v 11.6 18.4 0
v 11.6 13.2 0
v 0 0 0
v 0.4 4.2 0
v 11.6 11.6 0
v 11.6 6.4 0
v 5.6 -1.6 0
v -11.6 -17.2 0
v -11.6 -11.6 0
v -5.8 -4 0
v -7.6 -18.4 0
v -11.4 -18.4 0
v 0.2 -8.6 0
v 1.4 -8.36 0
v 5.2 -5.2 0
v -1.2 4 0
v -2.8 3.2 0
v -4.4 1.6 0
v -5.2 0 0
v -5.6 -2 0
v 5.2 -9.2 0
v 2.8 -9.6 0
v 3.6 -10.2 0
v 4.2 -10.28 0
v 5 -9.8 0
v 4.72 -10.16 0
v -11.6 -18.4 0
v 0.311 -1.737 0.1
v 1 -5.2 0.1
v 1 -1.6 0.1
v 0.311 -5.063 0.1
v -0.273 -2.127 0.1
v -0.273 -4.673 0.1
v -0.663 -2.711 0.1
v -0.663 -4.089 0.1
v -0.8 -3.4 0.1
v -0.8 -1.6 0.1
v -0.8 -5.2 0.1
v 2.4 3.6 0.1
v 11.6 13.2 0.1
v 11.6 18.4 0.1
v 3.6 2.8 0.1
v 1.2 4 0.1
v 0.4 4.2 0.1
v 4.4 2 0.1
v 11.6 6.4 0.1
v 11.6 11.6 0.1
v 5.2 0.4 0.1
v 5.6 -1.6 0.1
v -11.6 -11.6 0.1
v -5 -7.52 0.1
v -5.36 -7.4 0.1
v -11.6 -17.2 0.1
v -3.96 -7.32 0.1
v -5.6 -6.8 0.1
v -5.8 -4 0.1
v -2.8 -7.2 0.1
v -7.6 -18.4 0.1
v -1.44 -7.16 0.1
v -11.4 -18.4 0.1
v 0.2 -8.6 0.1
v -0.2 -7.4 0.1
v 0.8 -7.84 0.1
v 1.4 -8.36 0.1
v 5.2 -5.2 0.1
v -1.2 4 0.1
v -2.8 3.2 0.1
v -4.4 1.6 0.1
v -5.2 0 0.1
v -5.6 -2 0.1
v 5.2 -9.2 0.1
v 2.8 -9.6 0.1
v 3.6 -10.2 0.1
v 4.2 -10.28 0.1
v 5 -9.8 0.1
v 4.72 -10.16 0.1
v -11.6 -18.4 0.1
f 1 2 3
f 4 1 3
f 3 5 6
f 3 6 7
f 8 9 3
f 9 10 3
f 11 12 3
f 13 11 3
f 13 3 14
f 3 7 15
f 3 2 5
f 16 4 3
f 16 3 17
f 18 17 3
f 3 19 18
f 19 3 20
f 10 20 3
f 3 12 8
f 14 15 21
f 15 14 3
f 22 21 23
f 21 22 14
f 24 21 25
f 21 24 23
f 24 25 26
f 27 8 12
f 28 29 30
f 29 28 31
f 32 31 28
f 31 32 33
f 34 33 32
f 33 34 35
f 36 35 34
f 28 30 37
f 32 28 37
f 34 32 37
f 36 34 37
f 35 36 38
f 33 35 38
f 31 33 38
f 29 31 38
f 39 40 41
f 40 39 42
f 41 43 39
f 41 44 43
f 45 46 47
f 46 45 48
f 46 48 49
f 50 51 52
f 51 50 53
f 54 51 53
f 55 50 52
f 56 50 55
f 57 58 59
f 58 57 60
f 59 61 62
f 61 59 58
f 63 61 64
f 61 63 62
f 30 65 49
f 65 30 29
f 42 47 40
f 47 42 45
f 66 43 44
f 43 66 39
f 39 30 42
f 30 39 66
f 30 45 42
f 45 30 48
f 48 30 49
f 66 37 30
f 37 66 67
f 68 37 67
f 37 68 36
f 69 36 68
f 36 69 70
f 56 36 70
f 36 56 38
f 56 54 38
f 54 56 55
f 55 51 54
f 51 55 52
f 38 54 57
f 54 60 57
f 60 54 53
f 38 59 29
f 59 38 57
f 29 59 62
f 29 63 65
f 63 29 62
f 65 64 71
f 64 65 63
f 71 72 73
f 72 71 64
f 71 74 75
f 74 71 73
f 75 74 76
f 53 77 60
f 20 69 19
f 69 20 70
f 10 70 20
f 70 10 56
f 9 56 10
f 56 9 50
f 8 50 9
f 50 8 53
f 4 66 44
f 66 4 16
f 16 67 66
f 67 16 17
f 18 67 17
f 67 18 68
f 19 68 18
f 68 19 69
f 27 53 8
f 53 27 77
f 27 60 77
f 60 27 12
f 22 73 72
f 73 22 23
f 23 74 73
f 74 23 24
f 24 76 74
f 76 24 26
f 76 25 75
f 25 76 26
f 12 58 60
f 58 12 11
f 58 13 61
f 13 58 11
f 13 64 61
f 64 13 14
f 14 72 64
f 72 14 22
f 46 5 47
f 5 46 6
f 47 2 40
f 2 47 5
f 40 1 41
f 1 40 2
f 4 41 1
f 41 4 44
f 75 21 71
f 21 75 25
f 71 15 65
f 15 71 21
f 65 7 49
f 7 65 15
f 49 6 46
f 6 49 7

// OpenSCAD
// file: ../p/4-4edge.scad
use <../lib.scad>
$fa=1; $fs=0.2;
function ldraw_lib__4_4edge(realsolid=false) = [
// 0 Circle 1.0
// 0 Name: 4-4edge.dat
// 0 Author: James Jessiman
// 0 !LDRAW_ORG Primitive UPDATE 2017-01
// 0 !LICENSE Licensed under CC BY 2.0 and CC BY 4.0 : see CAreadme.txt
// 
// 0 BFC CERTIFY CCW
  [0,"BFC","CERTIFY"],
  [0,"BFC","CCW"],
// 
// 0 !HISTORY 1998-12-15 [PTadmin] Official Update 1998-10
// 0 !HISTORY 2005-12-28 [PTadmin] Official Update 2005-01
// 0 !HISTORY 2007-06-24 [PTadmin] Header formatted for Contributor Agreement
// 0 !HISTORY 2008-07-01 [PTadmin] Official Update 2008-01
// 0 !HISTORY 2017-01-15 [Steffen] BFCed
// 0 !HISTORY 2017-12-30 [PTadmin] Official Update 2017-01
// 
// 
// 2 24 1 0 0 0.9239 0 0.3827
  [2,24,1,0,0,0.9239,0,0.3827],
// 2 24 0.9239 0 0.3827 0.7071 0 0.7071
  [2,24,0.9239,0,0.3827,0.7071,0,0.7071],
// 2 24 0.7071 0 0.7071 0.3827 0 0.9239
  [2,24,0.7071,0,0.7071,0.3827,0,0.9239],
// 2 24 0.3827 0 0.9239 0 0 1
  [2,24,0.3827,0,0.9239,0,0,1],
// 2 24 0 0 1 -0.3827 0 0.9239
  [2,24,0,0,1,-0.3827,0,0.9239],
// 2 24 -0.3827 0 0.9239 -0.7071 0 0.7071
  [2,24,-0.3827,0,0.9239,-0.7071,0,0.7071],
// 2 24 -0.7071 0 0.7071 -0.9239 0 0.3827
  [2,24,-0.7071,0,0.7071,-0.9239,0,0.3827],
// 2 24 -0.9239 0 0.3827 -1 0 -0
  [2,24,-0.9239,0,0.3827,-1,0,-0],
// 2 24 -1 0 -0 -0.9239 0 -0.3827
  [2,24,-1,0,-0,-0.9239,0,-0.3827],
// 2 24 -0.9239 0 -0.3827 -0.7071 0 -0.7071
  [2,24,-0.9239,0,-0.3827,-0.7071,0,-0.7071],
// 2 24 -0.7071 0 -0.7071 -0.3827 0 -0.9239
  [2,24,-0.7071,0,-0.7071,-0.3827,0,-0.9239],
// 2 24 -0.3827 0 -0.9239 0 0 -1
  [2,24,-0.3827,0,-0.9239,0,0,-1],
// 2 24 0 0 -1 0.3827 0 -0.9239
  [2,24,0,0,-1,0.3827,0,-0.9239],
// 2 24 0.3827 0 -0.9239 0.7071 0 -0.7071
  [2,24,0.3827,0,-0.9239,0.7071,0,-0.7071],
// 2 24 0.7071 0 -0.7071 0.9239 0 -0.3827
  [2,24,0.7071,0,-0.7071,0.9239,0,-0.3827],
// 2 24 0.9239 0 -0.3827 1 0 0
  [2,24,0.9239,0,-0.3827,1,0,0],
];
module ldraw_lib__4_4edge(step=0, col=false, unit=2/5, alt=false, line=0.2, solid=!$preview)
    makepoly(ldraw_lib__4_4edge(solid), step=step, col=col, unit=unit, alt=alt, line=line, solid=solid);
ldraw_lib__4_4edge(line=0.2);
// file: ../p/4-4disc.scad
use <../lib.scad>
$fa=1; $fs=0.2;
function ldraw_lib__4_4disc(realsolid=false) = [
// 0 Disc 1.0
// 0 Name: 4-4disc.dat
// 0 Author: James Jessiman
// 0 !LDRAW_ORG Primitive UPDATE 2002-02
// 0 !LICENSE Licensed under CC BY 2.0 and CC BY 4.0 : see CAreadme.txt
// 
// 0 BFC CERTIFY CCW
  [0,"BFC","CERTIFY"],
  [0,"BFC","CCW"],
// 
// 0 !HISTORY 1998-12-15 [PTadmin] Official Update 1998-10
// 0 !HISTORY 2002-03-23 [sbliss] Added BFC statement
// 0 !HISTORY 2002-04-25 [PTadmin] Official Update 2002-02
// 0 !HISTORY 2007-06-24 [PTadmin] Header formatted for Contributor Agreement
// 0 !HISTORY 2008-07-01 [PTadmin] Official Update 2008-01
// 
// 
// 3 16 0 0 0 1 0 0 0.9239 0 0.3827
  [3,16,0,0,0,1,0,0,0.9239,0,0.3827],
// 3 16 0 0 0 0.9239 0 0.3827 0.7071 0 0.7071
  [3,16,0,0,0,0.9239,0,0.3827,0.7071,0,0.7071],
// 3 16 0 0 0 0.7071 0 0.7071 0.3827 0 0.9239
  [3,16,0,0,0,0.7071,0,0.7071,0.3827,0,0.9239],
// 3 16 0 0 0 0.3827 0 0.9239 0 0 1
  [3,16,0,0,0,0.3827,0,0.9239,0,0,1],
// 3 16 0 0 0 0 0 1 -0.3827 0 0.9239
  [3,16,0,0,0,0,0,1,-0.3827,0,0.9239],
// 3 16 0 0 0 -0.3827 0 0.9239 -0.7071 0 0.7071
  [3,16,0,0,0,-0.3827,0,0.9239,-0.7071,0,0.7071],
// 3 16 0 0 0 -0.7071 0 0.7071 -0.9239 0 0.3827
  [3,16,0,0,0,-0.7071,0,0.7071,-0.9239,0,0.3827],
// 3 16 0 0 0 -0.9239 0 0.3827 -1 0 -0
  [3,16,0,0,0,-0.9239,0,0.3827,-1,0,-0],
// 3 16 0 0 0 -1 0 -0 -0.9239 0 -0.3827
  [3,16,0,0,0,-1,0,-0,-0.9239,0,-0.3827],
// 3 16 0 0 0 -0.9239 0 -0.3827 -0.7071 0 -0.7071
  [3,16,0,0,0,-0.9239,0,-0.3827,-0.7071,0,-0.7071],
// 3 16 0 0 0 -0.7071 0 -0.7071 -0.3827 0 -0.9239
  [3,16,0,0,0,-0.7071,0,-0.7071,-0.3827,0,-0.9239],
// 3 16 0 0 0 -0.3827 0 -0.9239 0 0 -1
  [3,16,0,0,0,-0.3827,0,-0.9239,0,0,-1],
// 3 16 0 0 0 0 0 -1 0.3827 0 -0.9239
  [3,16,0,0,0,0,0,-1,0.3827,0,-0.9239],
// 3 16 0 0 0 0.3827 0 -0.9239 0.7071 0 -0.7071
  [3,16,0,0,0,0.3827,0,-0.9239,0.7071,0,-0.7071],
// 3 16 0 0 0 0.7071 0 -0.7071 0.9239 0 -0.3827
  [3,16,0,0,0,0.7071,0,-0.7071,0.9239,0,-0.3827],
// 3 16 0 0 0 0.9239 0 -0.3827 1 0 0
  [3,16,0,0,0,0.9239,0,-0.3827,1,0,0],
// 0
];
module ldraw_lib__4_4disc(step=0, col=false, unit=2/5, alt=false, line=0.2, solid=!$preview)
    makepoly(ldraw_lib__4_4disc(solid), step=step, col=col, unit=unit, alt=alt, line=line, solid=solid);
ldraw_lib__4_4disc(line=0.2);
// file: ../p/4-4cyli.scad
use <../lib.scad>
$fa=1; $fs=0.2;
function ldraw_lib__4_4cyli(realsolid=false) = [
// 0 Cylinder 1.0
// 0 Name: 4-4cyli.dat
// 0 Author: James Jessiman
// 0 !LDRAW_ORG Primitive UPDATE 2005-01
// 0 !LICENSE Licensed under CC BY 2.0 and CC BY 4.0 : see CAreadme.txt
// 
// 0 BFC CERTIFY CCW
  [0,"BFC","CERTIFY"],
  [0,"BFC","CCW"],
// 
// 0 !HISTORY 1998-12-15 [PTadmin] Official Update 1998-10
// 0 !HISTORY 2002-03-23 [sbliss] Added BFC statement; merged headers from files in distributions LDraw 0.27 and Complete.
// 0 !HISTORY 2002-04-25 [PTadmin] Official Update 2002-02
// 0 !HISTORY 2004-12-14 [guyvivan] BFC CCW
// 0 !HISTORY 2005-12-28 [PTadmin] Official Update 2005-01
// 0 !HISTORY 2007-06-24 [PTadmin] Header formatted for Contributor Agreement
// 0 !HISTORY 2008-07-01 [PTadmin] Official Update 2008-01
// 
// 
// 4 16 1 1 0 0.9239 1 0.3827 0.9239 0 0.3827 1 0 0
  [4,16,1,1,0,0.9239,1,0.3827,0.9239,0,0.3827,1,0,0],
// 5 24 1 0 0 1 1 0 0.9239 0 0.3827 0.9239 0 -0.3827
  [5,24,1,0,0,1,1,0,0.9239,0,0.3827,0.9239,0,-0.3827],
// 4 16 0.9239 1 0.3827 0.7071 1 0.7071 0.7071 0 0.7071 0.9239 0 0.3827
  [4,16,0.9239,1,0.3827,0.7071,1,0.7071,0.7071,0,0.7071,0.9239,0,0.3827],
// 5 24 0.9239 0 0.3827 0.9239 1 0.3827 0.7071 0 0.7071 1 0 0
  [5,24,0.9239,0,0.3827,0.9239,1,0.3827,0.7071,0,0.7071,1,0,0],
// 4 16 0.7071 1 0.7071 0.3827 1 0.9239 0.3827 0 0.9239 0.7071 0 0.7071
  [4,16,0.7071,1,0.7071,0.3827,1,0.9239,0.3827,0,0.9239,0.7071,0,0.7071],
// 5 24 0.7071 0 0.7071 0.7071 1 0.7071 0.3827 0 0.9239 0.9239 0 0.3827
  [5,24,0.7071,0,0.7071,0.7071,1,0.7071,0.3827,0,0.9239,0.9239,0,0.3827],
// 4 16 0.3827 1 0.9239 0 1 1 0 0 1 0.3827 0 0.9239
  [4,16,0.3827,1,0.9239,0,1,1,0,0,1,0.3827,0,0.9239],
// 5 24 0.3827 0 0.9239 0.3827 1 0.9239 0 0 1 0.7071 0 0.7071
  [5,24,0.3827,0,0.9239,0.3827,1,0.9239,0,0,1,0.7071,0,0.7071],
// 4 16 0 1 1 -0.3827 1 0.9239 -0.3827 0 0.9239 0 0 1
  [4,16,0,1,1,-0.3827,1,0.9239,-0.3827,0,0.9239,0,0,1],
// 5 24 0 0 1 0 1 1 -0.3827 0 0.9239 0.3827 0 0.9239
  [5,24,0,0,1,0,1,1,-0.3827,0,0.9239,0.3827,0,0.9239],
// 4 16 -0.3827 1 0.9239 -0.7071 1 0.7071 -0.7071 0 0.7071 -0.3827 0 0.9239
  [4,16,-0.3827,1,0.9239,-0.7071,1,0.7071,-0.7071,0,0.7071,-0.3827,0,0.9239],
// 5 24 -0.3827 0 0.9239 -0.3827 1 0.9239 -0.7071 0 0.7071 0 0 1
  [5,24,-0.3827,0,0.9239,-0.3827,1,0.9239,-0.7071,0,0.7071,0,0,1],
// 4 16 -0.7071 1 0.7071 -0.9239 1 0.3827 -0.9239 0 0.3827 -0.7071 0 0.7071
  [4,16,-0.7071,1,0.7071,-0.9239,1,0.3827,-0.9239,0,0.3827,-0.7071,0,0.7071],
// 5 24 -0.7071 0 0.7071 -0.7071 1 0.7071 -0.9239 0 0.3827 -0.3827 0 0.9239
  [5,24,-0.7071,0,0.7071,-0.7071,1,0.7071,-0.9239,0,0.3827,-0.3827,0,0.9239],
// 4 16 -0.9239 1 0.3827 -1 1 0 -1 0 0 -0.9239 0 0.3827
  [4,16,-0.9239,1,0.3827,-1,1,0,-1,0,0,-0.9239,0,0.3827],
// 5 24 -0.9239 0 0.3827 -0.9239 1 0.3827 -1 0 0 -0.7071 0 0.7071
  [5,24,-0.9239,0,0.3827,-0.9239,1,0.3827,-1,0,0,-0.7071,0,0.7071],
// 4 16 -1 1 0 -0.9239 1 -0.3827 -0.9239 0 -0.3827 -1 0 0
  [4,16,-1,1,0,-0.9239,1,-0.3827,-0.9239,0,-0.3827,-1,0,0],
// 5 24 -1 0 0 -1 1 0 -0.9239 0 -0.3827 -0.9239 0 0.3827
  [5,24,-1,0,0,-1,1,0,-0.9239,0,-0.3827,-0.9239,0,0.3827],
// 4 16 -0.9239 1 -0.3827 -0.7071 1 -0.7071 -0.7071 0 -0.7071 -0.9239 0 -0.3827
  [4,16,-0.9239,1,-0.3827,-0.7071,1,-0.7071,-0.7071,0,-0.7071,-0.9239,0,-0.3827],
// 5 24 -0.9239 0 -0.3827 -0.9239 1 -0.3827 -0.7071 0 -0.7071 -1 0 0
  [5,24,-0.9239,0,-0.3827,-0.9239,1,-0.3827,-0.7071,0,-0.7071,-1,0,0],
// 4 16 -0.7071 1 -0.7071 -0.3827 1 -0.9239 -0.3827 0 -0.9239 -0.7071 0 -0.7071
  [4,16,-0.7071,1,-0.7071,-0.3827,1,-0.9239,-0.3827,0,-0.9239,-0.7071,0,-0.7071],
// 5 24 -0.7071 0 -0.7071 -0.7071 1 -0.7071 -0.3827 0 -0.9239 -0.9239 0 -0.3827
  [5,24,-0.7071,0,-0.7071,-0.7071,1,-0.7071,-0.3827,0,-0.9239,-0.9239,0,-0.3827],
// 4 16 -0.3827 1 -0.9239 0 1 -1 0 0 -1 -0.3827 0 -0.9239
  [4,16,-0.3827,1,-0.9239,0,1,-1,0,0,-1,-0.3827,0,-0.9239],
// 5 24 -0.3827 0 -0.9239 -0.3827 1 -0.9239 0 0 -1 -0.7071 0 -0.7071
  [5,24,-0.3827,0,-0.9239,-0.3827,1,-0.9239,0,0,-1,-0.7071,0,-0.7071],
// 4 16 0 1 -1 0.3827 1 -0.9239 0.3827 0 -0.9239 0 0 -1
  [4,16,0,1,-1,0.3827,1,-0.9239,0.3827,0,-0.9239,0,0,-1],
// 5 24 0 0 -1 0 1 -1 0.3827 0 -0.9239 -0.3827 0 -0.9239
  [5,24,0,0,-1,0,1,-1,0.3827,0,-0.9239,-0.3827,0,-0.9239],
// 4 16 0.3827 1 -0.9239 0.7071 1 -0.7071 0.7071 0 -0.7071 0.3827 0 -0.9239
  [4,16,0.3827,1,-0.9239,0.7071,1,-0.7071,0.7071,0,-0.7071,0.3827,0,-0.9239],
// 5 24 0.3827 0 -0.9239 0.3827 1 -0.9239 0.7071 0 -0.7071 0 0 -1
  [5,24,0.3827,0,-0.9239,0.3827,1,-0.9239,0.7071,0,-0.7071,0,0,-1],
// 4 16 0.7071 1 -0.7071 0.9239 1 -0.3827 0.9239 0 -0.3827 0.7071 0 -0.7071
  [4,16,0.7071,1,-0.7071,0.9239,1,-0.3827,0.9239,0,-0.3827,0.7071,0,-0.7071],
// 5 24 0.7071 0 -0.7071 0.7071 1 -0.7071 0.9239 0 -0.3827 0.3827 0 -0.9239
  [5,24,0.7071,0,-0.7071,0.7071,1,-0.7071,0.9239,0,-0.3827,0.3827,0,-0.9239],
// 4 16 0.9239 1 -0.3827 1 1 0 1 0 0 0.9239 0 -0.3827
  [4,16,0.9239,1,-0.3827,1,1,0,1,0,0,0.9239,0,-0.3827],
// 5 24 0.9239 0 -0.3827 0.9239 1 -0.3827 1 0 0 0.7071 0 -0.7071
  [5,24,0.9239,0,-0.3827,0.9239,1,-0.3827,1,0,0,0.7071,0,-0.7071],
// 0
];
module ldraw_lib__4_4cyli(step=0, col=false, unit=2/5, alt=false, line=0.2, solid=!$preview)
    makepoly(ldraw_lib__4_4cyli(solid), step=step, col=col, unit=unit, alt=alt, line=line, solid=solid);
ldraw_lib__4_4cyli(line=0.2);
// file: ../p/stud3.scad
use <../lib.scad>
use <4-4cyli.scad>
use <4-4disc.scad>
use <4-4edge.scad>
$fa=1; $fs=0.2;
function ldraw_lib__stud3(realsolid=false) = realsolid ? 
    [openscad(translate([0,0,-eps()], o=cylinder(4+eps(), r=4)),2)] : [
// 0 Stud Tube Solid
// 0 Name: stud3.dat
// 0 Author: James Jessiman
// 0 !LDRAW_ORG Primitive UPDATE 2012-01
// 0 !LICENSE Licensed under CC BY 2.0 and CC BY 4.0 : see CAreadme.txt
// 
// 0 BFC CERTIFY CCW
  [0,"BFC","CERTIFY"],
  [0,"BFC","CCW"],
// 
// 0 !HISTORY 2002-04-04 [sbliss] Modified for BFC compliance
// 0 !HISTORY 2002-04-25 [PTadmin] Official Update 2002-02
// 0 !HISTORY 2007-06-24 [PTadmin] Header formatted for Contributor Agreement
// 0 !HISTORY 2008-07-01 [PTadmin] Official Update 2008-01
// 0 !HISTORY 2012-02-16 [Philo] Changed to CCW
// 0 !HISTORY 2012-03-30 [PTadmin] Official Update 2012-01
// 
// 
// 1 16 0 -4 0 4 0 0 0 1 0 0 0 4 4-4edge.dat
  [1,16,0,-4,0,4,0,0,0,1,0,0,0,4, ldraw_lib__4_4edge(realsolid)],
// 1 16 0 0 0 4 0 0 0 1 0 0 0 4 4-4edge.dat
  [1,16,0,0,0,4,0,0,0,1,0,0,0,4, ldraw_lib__4_4edge(realsolid)],
// 1 16 0 -4 0 4 0 0 0 1 0 0 0 4 4-4disc.dat
  [1,16,0,-4,0,4,0,0,0,1,0,0,0,4, ldraw_lib__4_4disc(realsolid)],
// 1 16 0 -4 0 4 0 0 0 4 0 0 0 4 4-4cyli.dat
  [1,16,0,-4,0,4,0,0,0,4,0,0,0,4, ldraw_lib__4_4cyli(realsolid)],
];
module ldraw_lib__stud3(step=0, col=false, unit=2/5, alt=false, line=0.2, solid=!$preview)
    makepoly(ldraw_lib__stud3(solid), step=step, col=col, unit=unit, alt=alt, line=line, solid=solid);
ldraw_lib__stud3(line=0.2);
// file: ../p/stud.scad
use <../lib.scad>
use <4-4cyli.scad>
use <4-4disc.scad>
use <4-4edge.scad>
$fa=1; $fs=0.2;
function ldraw_lib__stud(realsolid=false) = realsolid ? 
    [openscad(translate([0,0,-eps()], o=cylinder(4+eps(), r=6)),2)] : [
// 0 Stud
// 0 Name: stud.dat
// 0 Author: James Jessiman
// 0 !LDRAW_ORG Primitive UPDATE 2012-01
// 0 !LICENSE Licensed under CC BY 2.0 and CC BY 4.0 : see CAreadme.txt
// 
// 0 BFC CERTIFY CCW
  [0,"BFC","CERTIFY"],
  [0,"BFC","CCW"],
// 
// 0 !HISTORY 2002-04-04 [sbliss] Modified for BFC compliance
// 0 !HISTORY 2002-04-25 [PTadmin] Official Update 2002-02
// 0 !HISTORY 2007-06-24 [PTadmin] Header formatted for Contributor Agreement
// 0 !HISTORY 2008-07-01 [PTadmin] Official Update 2008-01
// 0 !HISTORY 2012-02-16 [Philo] Changed to CCW
// 0 !HISTORY 2012-03-30 [PTadmin] Official Update 2012-01
// 
// 
// 1 16 0 0 0 6 0 0 0 1 0 0 0 6 4-4edge.dat
  [1,16,0,0,0,6,0,0,0,1,0,0,0,6, ldraw_lib__4_4edge(realsolid)],
// 1 16 0 -4 0 6 0 0 0 1 0 0 0 6 4-4edge.dat
  [1,16,0,-4,0,6,0,0,0,1,0,0,0,6, ldraw_lib__4_4edge(realsolid)],
// 1 16 0 0 0 6 0 0 0 -4 0 0 0 6 4-4cyli.dat
  [1,16,0,0,0,6,0,0,0,-4,0,0,0,6, ldraw_lib__4_4cyli(realsolid)],
// 1 16 0 -4 0 6 0 0 0 1 0 0 0 6 4-4disc.dat
  [1,16,0,-4,0,6,0,0,0,1,0,0,0,6, ldraw_lib__4_4disc(realsolid)],
];
module ldraw_lib__stud(step=0, col=false, unit=2/5, alt=false, line=0.2, solid=!$preview)
    makepoly(ldraw_lib__stud(solid), step=step, col=col, unit=unit, alt=alt, line=line, solid=solid);
ldraw_lib__stud(line=0.2);
// file: ../p/box5.scad
use <../lib.scad>
$fa=1; $fs=0.2;
function ldraw_lib__box5(realsolid=false) = [
// 0 Box with 5 Faces and All Edges
// 0 Name: box5.dat
// 0 Author: James Jessiman
// 0 !LDRAW_ORG Primitive UPDATE 2012-01
// 0 !LICENSE Licensed under CC BY 2.0 and CC BY 4.0 : see CAreadme.txt
// 
// 0 BFC CERTIFY CCW
  [0,"BFC","CERTIFY"],
  [0,"BFC","CCW"],
// 
// 0 !HISTORY 2002-04-03 [sbliss] Modified for BFC compliance
// 0 !HISTORY 2002-04-25 [PTadmin] Official Update 2002-02
// 0 !HISTORY 2007-06-24 [PTadmin] Header formatted for Contributor Agreement
// 0 !HISTORY 2008-07-01 [PTadmin] Official Update 2008-01
// 0 !HISTORY 2012-02-16 [Philo] Changed to CCW
// 0 !HISTORY 2012-03-30 [PTadmin] Official Update 2012-01
// 
// 
// 2 24 1 1 1 -1 1 1
  [2,24,1,1,1,-1,1,1],
// 2 24 -1 1 1 -1 1 -1
  [2,24,-1,1,1,-1,1,-1],
// 2 24 -1 1 -1 1 1 -1
  [2,24,-1,1,-1,1,1,-1],
// 2 24 1 1 -1 1 1 1
  [2,24,1,1,-1,1,1,1],
// 2 24 1 0 1 -1 0 1
  [2,24,1,0,1,-1,0,1],
// 2 24 -1 0 1 -1 0 -1
  [2,24,-1,0,1,-1,0,-1],
// 2 24 -1 0 -1 1 0 -1
  [2,24,-1,0,-1,1,0,-1],
// 2 24 1 0 -1 1 0 1
  [2,24,1,0,-1,1,0,1],
// 2 24 1 0 1 1 1 1
  [2,24,1,0,1,1,1,1],
// 2 24 -1 0 1 -1 1 1
  [2,24,-1,0,1,-1,1,1],
// 2 24 1 0 -1 1 1 -1
  [2,24,1,0,-1,1,1,-1],
// 2 24 -1 0 -1 -1 1 -1
  [2,24,-1,0,-1,-1,1,-1],
// 4 16 -1 1 1 1 1 1 1 1 -1 -1 1 -1
  [4,16,-1,1,1,1,1,1,1,1,-1,-1,1,-1],
// 4 16 -1 1 1 -1 0 1 1 0 1 1 1 1
  [4,16,-1,1,1,-1,0,1,1,0,1,1,1,1],
// 4 16 -1 1 -1 -1 0 -1 -1 0 1 -1 1 1
  [4,16,-1,1,-1,-1,0,-1,-1,0,1,-1,1,1],
// 4 16 1 1 -1 1 0 -1 -1 0 -1 -1 1 -1
  [4,16,1,1,-1,1,0,-1,-1,0,-1,-1,1,-1],
// 4 16 1 1 1 1 0 1 1 0 -1 1 1 -1
  [4,16,1,1,1,1,0,1,1,0,-1,1,1,-1],
];
module ldraw_lib__box5(step=0, col=false, unit=2/5, alt=false, line=0.2, solid=!$preview)
    makepoly(ldraw_lib__box5(solid), step=step, col=col, unit=unit, alt=alt, line=line, solid=solid);
ldraw_lib__box5(line=0.2);
// file: ../p/box4t.scad
use <../lib.scad>
$fa=1; $fs=0.2;
function ldraw_lib__box4t(realsolid=false) = [
// 0 Box with 4 Adjacent Faces and All Edges
// 0 Name: box4t.dat
// 0 Author: Tore Eriksson [Tore_Eriksson]
// 0 !LDRAW_ORG Primitive UPDATE 2003-02
// 0 !LICENSE Licensed under CC BY 2.0 and CC BY 4.0 : see CAreadme.txt
// 
// 0 BFC CERTIFY CCW
  [0,"BFC","CERTIFY"],
  [0,"BFC","CCW"],
// 
// 0 !HISTORY 1997-09-29 [PTadmin] Official Update 1997-15
// 0 !HISTORY 2002-08-31 [izanette] Modified with WINDZ for BFC compliance
// 0 !HISTORY 2003-08-01 [PTadmin] Official Update 2003-02
// 0 !HISTORY 2007-06-24 [PTadmin] Header formatted for Contributor Agreement
// 0 !HISTORY 2008-07-01 [PTadmin] Official Update 2008-01
// 
// 
// 2 24 1 1 1 -1 1 1
  [2,24,1,1,1,-1,1,1],
// 2 24 -1 1 1 -1 1 -1
  [2,24,-1,1,1,-1,1,-1],
// 2 24 -1 1 -1 1 1 -1
  [2,24,-1,1,-1,1,1,-1],
// 2 24 1 1 -1 1 1 1
  [2,24,1,1,-1,1,1,1],
// 2 24 1 0 1 -1 0 1
  [2,24,1,0,1,-1,0,1],
// 2 24 -1 0 1 -1 0 -1
  [2,24,-1,0,1,-1,0,-1],
// 2 24 -1 0 -1 1 0 -1
  [2,24,-1,0,-1,1,0,-1],
// 2 24 1 0 -1 1 0 1
  [2,24,1,0,-1,1,0,1],
// 2 24 1 0 1 1 1 1
  [2,24,1,0,1,1,1,1],
// 2 24 -1 0 1 -1 1 1
  [2,24,-1,0,1,-1,1,1],
// 2 24 1 0 -1 1 1 -1
  [2,24,1,0,-1,1,1,-1],
// 2 24 -1 0 -1 -1 1 -1
  [2,24,-1,0,-1,-1,1,-1],
// 4 16 1 1 1 1 1 -1 -1 1 -1 -1 1 1
  [4,16,1,1,1,1,1,-1,-1,1,-1,-1,1,1],
// 4 16 1 1 1 -1 1 1 -1 0 1 1 0 1
  [4,16,1,1,1,-1,1,1,-1,0,1,1,0,1],
// 4 16 -1 1 1 -1 1 -1 -1 0 -1 -1 0 1
  [4,16,-1,1,1,-1,1,-1,-1,0,-1,-1,0,1],
// 0 4 16 -1 1 -1 -1 0 -1 1 0 -1 1 1 -1
// 4 16 1 1 -1 1 1 1 1 0 1 1 0 -1
  [4,16,1,1,-1,1,1,1,1,0,1,1,0,-1],
// 0
];
module ldraw_lib__box4t(step=0, col=false, unit=2/5, alt=false, line=0.2, solid=!$preview)
    makepoly(ldraw_lib__box4t(solid), step=step, col=col, unit=unit, alt=alt, line=line, solid=solid);
ldraw_lib__box4t(line=0.2);
// file: s/3004s01.scad
use <../../lib.scad>
use <../../p/box4t.scad>
use <../../p/box5.scad>
use <../../p/stud.scad>
use <../../p/stud3.scad>
$fa=1; $fs=0.2;
function ldraw_lib__s__3004s01(realsolid=false) = [
// 0 ~Brick  1 x  2 without Front Face
// 0 Name: s\3004s01.dat
// 0 Author: James Jessiman
// 0 !LDRAW_ORG Subpart UPDATE 2003-03
// 0 !LICENSE Licensed under CC BY 2.0 and CC BY 4.0 : see CAreadme.txt
// 
// 0 BFC CERTIFY CCW
  [0,"BFC","CERTIFY"],
  [0,"BFC","CCW"],
// 
// 0 !HISTORY 2003-09-07 [jriley] Subfiling, BFC
// 0 !HISTORY 2003-12-19 [PTadmin] Official Update 2003-03
// 0 !HISTORY 2007-08-29 [PTadmin] Header formatted for Contributor Agreement
// 0 !HISTORY 2008-07-01 [PTadmin] Official Update 2008-01
// 
// 
// 1 16 0 4 0 1 0 0 0 -5 0 0 0 1 stud3.dat
  [1,16,0,4,0,1,0,0,0,-5,0,0,0,1, ldraw_lib__stud3(realsolid)],
// 0 BFC INVERTNEXT
  [0,"BFC","INVERTNEXT"],
// 1 16 0 24 0 16 0 0 0 -20 0 0 0 6 box5.dat
  [1,16,0,24,0,16,0,0,0,-20,0,0,0,6, ldraw_lib__box5(realsolid)],
// 4 16 20 24 10 16 24 6 -16 24 6 -20 24 10
  [4,16,20,24,10,16,24,6,-16,24,6,-20,24,10],
// 4 16 -20 24 10 -16 24 6 -16 24 -6 -20 24 -10
  [4,16,-20,24,10,-16,24,6,-16,24,-6,-20,24,-10],
// 4 16 -20 24 -10 -16 24 -6 16 24 -6 20 24 -10
  [4,16,-20,24,-10,-16,24,-6,16,24,-6,20,24,-10],
// 4 16 20 24 -10 16 24 -6 16 24 6 20 24 10
  [4,16,20,24,-10,16,24,-6,16,24,6,20,24,10],
// 1 16 0 24 0 20 0 0 0 -24 0 0 0 10 box4t.dat
  [1,16,0,24,0,20,0,0,0,-24,0,0,0,10, ldraw_lib__box4t(realsolid)],
// 1 16 10 0 0 1 0 0 0 1 0 0 0 1 stud.dat
  [1,16,10,0,0,1,0,0,0,1,0,0,0,1, ldraw_lib__stud(realsolid)],
// 1 16 -10 0 0 1 0 0 0 1 0 0 0 1 stud.dat
  [1,16,-10,0,0,1,0,0,0,1,0,0,0,1, ldraw_lib__stud(realsolid)],
// 0
];
module ldraw_lib__s__3004s01(step=0, col=false, unit=2/5, alt=false, line=0.2, solid=!$preview)
    makepoly(ldraw_lib__s__3004s01(solid), step=step, col=col, unit=unit, alt=alt, line=line, solid=solid);
ldraw_lib__s__3004s01(line=0.2);
// file: 3004.scad
use <../lib.scad>
use <s/3004s01.scad>
$fa=1; $fs=0.2;
function ldraw_lib__3004(realsolid=false) = [
// 0 Brick  1 x  2
// 0 Name: 3004.dat
// 0 Author: James Jessiman
// 0 !LDRAW_ORG Part UPDATE 2022-05
// 0 !LICENSE Licensed under CC BY 2.0 and CC BY 4.0 : see CAreadme.txt
// 
// 0 BFC CERTIFY CCW
  [0,"BFC","CERTIFY"],
  [0,"BFC","CCW"],
// 
// 0 !HISTORY 2001-10-26 [PTadmin] Official Update 2001-01
// 0 !HISTORY 2002-05-07 {unknown} BFC Certification
// 0 !HISTORY 2002-06-11 [PTadmin] Official Update 2002-03
// 0 !HISTORY 2007-05-07 [PTadmin] Header formatted for Contributor Agreement
// 0 !HISTORY 2008-07-01 [PTadmin] Official Update 2008-01
// 0 !HISTORY 2022-08-04 [MagFors] Using subfile
// 0 !HISTORY 2022-09-15 [PTadmin] Official Update 2022-05
// 
// 
// 1 16 0 0 0 1 0 0 0 1 0 0 0 1 s\3004s01.dat
  [1,16,0,0,0,1,0,0,0,1,0,0,0,1, ldraw_lib__s__3004s01(realsolid)],
// 4 16 -20 24 -10 20 24 -10 20 0 -10 -20 0 -10
  [4,16,-20,24,-10,20,24,-10,20,0,-10,-20,0,-10],
];
module ldraw_lib__3004(step=0, col=false, unit=2/5, alt=false, line=0.2, solid=!$preview)
    makepoly(ldraw_lib__3004(solid), step=step, col=col, unit=unit, alt=alt, line=line, solid=solid);
ldraw_lib__3004(line=0.2);
// file: ../p/2-4ndis.scad
use <../lib.scad>
$fa=1; $fs=0.2;
function ldraw_lib__2_4ndis(realsolid=false) = [
// 0 Disc Negative 0.5
// 0 Name: 2-4ndis.dat
// 0 Author: James Jessiman
// 0 !LDRAW_ORG Primitive UPDATE 2012-01
// 0 !LICENSE Licensed under CC BY 2.0 and CC BY 4.0 : see CAreadme.txt
// 
// 0 BFC CERTIFY CCW
  [0,"BFC","CERTIFY"],
  [0,"BFC","CCW"],
// 
// 0 !HISTORY 2002-03-23 [sbliss] Added BFC statement; compacted code
// 0 !HISTORY 2002-04-25 [PTadmin] Official Update 2002-02
// 0 !HISTORY 2007-06-24 [PTadmin] Header formatted for Contributor Agreement
// 0 !HISTORY 2008-07-01 [PTadmin] Official Update 2008-01
// 0 !HISTORY 2012-02-16 [Philo] Changed to CCW
// 0 !HISTORY 2012-03-30 [PTadmin] Official Update 2012-01
// 
// 
// 3 16 0.9239 0 0.3827 1 0 0 1 0 1
  [3,16,0.9239,0,0.3827,1,0,0,1,0,1],
// 3 16 0.7071 0 0.7071 0.9239 0 0.3827 1 0 1
  [3,16,0.7071,0,0.7071,0.9239,0,0.3827,1,0,1],
// 3 16 0.3827 0 0.9239 0.7071 0 0.7071 1 0 1
  [3,16,0.3827,0,0.9239,0.7071,0,0.7071,1,0,1],
// 3 16 0 0 1 0.3827 0 0.9239 1 0 1
  [3,16,0,0,1,0.3827,0,0.9239,1,0,1],
// 3 16 -0.3827 0 0.9239 0 0 1 -1 0 1
  [3,16,-0.3827,0,0.9239,0,0,1,-1,0,1],
// 3 16 -0.7071 0 0.7071 -0.3827 0 0.9239 -1 0 1
  [3,16,-0.7071,0,0.7071,-0.3827,0,0.9239,-1,0,1],
// 3 16 -0.9239 0 0.3827 -0.7071 0 0.7071 -1 0 1
  [3,16,-0.9239,0,0.3827,-0.7071,0,0.7071,-1,0,1],
// 3 16 -1 0 0 -0.9239 0 0.3827 -1 0 1
  [3,16,-1,0,0,-0.9239,0,0.3827,-1,0,1],
];
module ldraw_lib__2_4ndis(step=0, col=false, unit=2/5, alt=false, line=0.2, solid=!$preview)
    makepoly(ldraw_lib__2_4ndis(solid), step=step, col=col, unit=unit, alt=alt, line=line, solid=solid);
ldraw_lib__2_4ndis(line=0.2);
// file: ../p/2-4chrd.scad
use <../lib.scad>
$fa=1; $fs=0.2;
function ldraw_lib__2_4chrd(realsolid=false) = [
// 0 Chord 0.5
// 0 Name: 2-4chrd.dat
// 0 Author: Philippe Hurbain [Philo]
// 0 !LDRAW_ORG Primitive UPDATE 2014-01
// 0 !LICENSE Licensed under CC BY 2.0 and CC BY 4.0 : see CAreadme.txt
// 
// 0 BFC CERTIFY CCW
  [0,"BFC","CERTIFY"],
  [0,"BFC","CCW"],
// 
// 0 !HISTORY 2014-06-21 [PTadmin] Official Update 2014-01
// 
// 
// 4 16 0.9239 0 0.3827 -0.9239 0 0.3827 -1 0 0 1 0 0
  [4,16,0.9239,0,0.3827,-0.9239,0,0.3827,-1,0,0,1,0,0],
// 4 16 0.7071 0 0.7071 -0.7071 0 0.7071 -0.9239 0 0.3827 0.9239 0 0.3827
  [4,16,0.7071,0,0.7071,-0.7071,0,0.7071,-0.9239,0,0.3827,0.9239,0,0.3827],
// 4 16 0.3827 0 0.9239 -0.3827 0 0.9239 -0.7071 0 0.7071 0.7071 0 0.7071
  [4,16,0.3827,0,0.9239,-0.3827,0,0.9239,-0.7071,0,0.7071,0.7071,0,0.7071],
// 3 16 0 0 1 -0.3827 0 0.9239 0.3827 0 0.9239
  [3,16,0,0,1,-0.3827,0,0.9239,0.3827,0,0.9239],
];
module ldraw_lib__2_4chrd(step=0, col=false, unit=2/5, alt=false, line=0.2, solid=!$preview)
    makepoly(ldraw_lib__2_4chrd(solid), step=step, col=col, unit=unit, alt=alt, line=line, solid=solid);
ldraw_lib__2_4chrd(line=0.2);
// main file
use <../lib.scad>
use <../p/2-4chrd.scad>
use <../p/2-4ndis.scad>
$fa=1; $fs=0.2;
function ldraw_lib__195985b(realsolid=false) = [
// 0 Sticker  4.6 x 2.9 with Red and Black Diagonal Stripe and White Helmet
// 0 Name: 195985b.dat
// 0 Author: Takeshi Takahashi [RainbowDolphin]
// 0 !LDRAW_ORG Part UPDATE 2022-05
// 0 !LICENSE Licensed under CC BY 2.0 and CC BY 4.0 : see CAreadme.txt
// 
// 0 !HELP Sticker clearance from part 47899c01 is 1LDU from each edge
// 0 !HELP 1 16 0 0 0 1 0 0 0 1 0 0 0 1 47899c01.dat
// 0 !HELP 1 16 2 57 30 0 -1 0 0 0 -1 1 0 0 195985b.dat
// 
// 0 BFC CERTIFY CCW
  [0,"BFC","CERTIFY"],
  [0,"BFC","CCW"],
// 
// 0 !KEYWORDS Bricklink 6373stk01, Brickowl 426334, Door, Motorcycle shop
// 0 !KEYWORDS Rebrickable 195985, Set 6373
// 
// 0 !HISTORY 2022-09-15 [PTadmin] Official Update 2022-05
// 
// 
// 3 16 29 0 46 29 0 33 0 0 0
  [3,16,29,0,46,29,0,33,0,0,0],
// 3 16 1 0 10.5 29 0 46 0 0 0
  [3,16,1,0,10.5,29,0,46,0,0,0],
// 3 16 0 0 0 29 0 29 29 0 16
  [3,16,0,0,0,29,0,29,29,0,16],
// 3 16 0 0 0 29 0 16 14 0 -4
  [3,16,0,0,0,29,0,16,14,0,-4],
// 3 16 -29 0 -43 -29 0 -29 0 0 0
  [3,16,-29,0,-43,-29,0,-29,0,0,0],
// 3 16 -29 0 -29 -14.5 0 -10 0 0 0
  [3,16,-29,0,-29,-14.5,0,-10,0,0,0],
// 3 16 -19 0 -46 -28.5 0 -46 0 0 0
  [3,16,-19,0,-46,-28.5,0,-46,0,0,0],
// 3 16 .5 0 -21.5 -19 0 -46 0 0 0
  [3,16,.5,0,-21.5,-19,0,-46,0,0,0],
// 3 16 .5 0 -21.5 0 0 0 3.5 0 -20.9
  [3,16,.5,0,-21.5,0,0,0,3.5,0,-20.9],
// 3 16 0 0 0 14 0 -4 13 0 -13
  [3,16,0,0,0,14,0,-4,13,0,-13],
// 3 16 0 0 0 29 0 33 29 0 29
  [3,16,0,0,0,29,0,33,29,0,29],
// 3 16 -3 0 10 1 0 10.5 0 0 0
  [3,16,-3,0,10,1,0,10.5,0,0,0],
// 3 16 -3 0 10 0 0 0 -7 0 8
  [3,16,-3,0,10,0,0,0,-7,0,8],
// 3 16 -11 0 4 -7 0 8 0 0 0
  [3,16,-11,0,4,-7,0,8,0,0,0],
// 4 16 -13 0 0 -11 0 4 0 0 0 -14 0 -5
  [4,16,-13,0,0,-11,0,4,0,0,0,-14,0,-5],
// 3 16 -14.5 0 -10 -14 0 -5 0 0 0
  [3,16,-14.5,0,-10,-14,0,-5,0,0,0],
// 3 16 0 0 0 -28.5 0 -46 -29 0 -43
  [3,16,0,0,0,-28.5,0,-46,-29,0,-43],
// 4 16 3.5 0 -20.9 0 0 0 13 0 -13 13 0 -23
  [4,16,3.5,0,-20.9,0,0,0,13,0,-13,13,0,-23],
// 4 16 7 0 -24 3.5 0 -20.9 13 0 -23 9 0 -25.5
  [4,16,7,0,-24,3.5,0,-20.9,13,0,-23,9,0,-25.5],
// 4 16 9 0 -25.5 13 0 -23 12.5 0 -24.5 10.5 0 -25.7
  [4,16,9,0,-25.5,13,0,-23,12.5,0,-24.5,10.5,0,-25.7],
// 3 16 10.5 0 -25.7 12.5 0 -24.5 11.8 0 -25.4
  [3,16,10.5,0,-25.7,12.5,0,-24.5,11.8,0,-25.4],
// 3 16 -29 0 -46 -29 0 -43 -28.5 0 -46
  [3,16,-29,0,-46,-29,0,-43,-28.5,0,-46],
// 1 7 2.5 -.25 -8.5 0 0 -4.5 0 1 0 4.5 0 0 2-4chrd.dat
  [1,7,2.5,-.25,-8.5,0,0,-4.5,0,1,0,4.5,0,0, ldraw_lib__2_4chrd(realsolid)],
// 1 15 2.5 -.25 -8.5 0 0 -4.5 0 1 0 4.5 0 0 2-4ndis.dat
  [1,15,2.5,-.25,-8.5,0,0,-4.5,0,1,0,4.5,0,0, ldraw_lib__2_4ndis(realsolid)],
// 4 4 9 -.25 7 29 -.25 33 29 -.25 46 6 -.25 9
  [4,4,9,-.25,7,29,-.25,33,29,-.25,46,6,-.25,9],
// 3 4 29 -.25 46 3 -.25 10 6 -.25 9
  [3,4,29,-.25,46,3,-.25,10,6,-.25,9],
// 3 4 29 -.25 46 1 -.25 10.5 3 -.25 10
  [3,4,29,-.25,46,1,-.25,10.5,3,-.25,10],
// 4 0 29 -.25 16 29 -.25 29 11 -.25 5 13 -.25 1
  [4,0,29,-.25,16,29,-.25,29,11,-.25,5,13,-.25,1],
// 3 0 29 -.25 16 13 -.25 1 14 -.25 -4
  [3,0,29,-.25,16,13,-.25,1,14,-.25,-4],
// 4 4 -13.4 -.25 -18.5 -29 -.25 -29 -29 -.25 -43 -12.5 -.25 -18.8
  [4,4,-13.4,-.25,-18.5,-29,-.25,-29,-29,-.25,-43,-12.5,-.25,-18.8],
// 3 4 -9.9 -.25 -18.3 -12.5 -.25 -18.8 -29 -.25 -43
  [3,4,-9.9,-.25,-18.3,-12.5,-.25,-18.8,-29,-.25,-43],
// 3 4 -14 -.25 -17 -29 -.25 -29 -13.4 -.25 -18.5
  [3,4,-14,-.25,-17,-29,-.25,-29,-13.4,-.25,-18.5],
// 3 4 -14.5 -.25 -10 -29 -.25 -29 -14 -.25 -17
  [3,4,-14.5,-.25,-10,-29,-.25,-29,-14,-.25,-17],
// 4 0 -7 -.25 -18 -28.5 -.25 -46 -19 -.25 -46 -3.6 -.25 -17.9
  [4,0,-7,-.25,-18,-28.5,-.25,-46,-19,-.25,-46,-3.6,-.25,-17.9],
// 4 0 -3.6 -.25 -17.9 -19 -.25 -46 .5 -.25 -21.5 -.5 -.25 -18.5
  [4,0,-3.6,-.25,-17.9,-19,-.25,-46,.5,-.25,-21.5,-.5,-.25,-18.5],
// 4 0 2 -.25 -19.6 -.5 -.25 -18.5 .5 -.25 -21.5 3.5 -.25 -20.9
  [4,0,2,-.25,-19.6,-.5,-.25,-18.5,.5,-.25,-21.5,3.5,-.25,-20.9],
// 4 7 14 -.25 -4 2.5 -.25 -4 2.5 -.25 -13 13 -.25 -13
  [4,7,14,-.25,-4,2.5,-.25,-4,2.5,-.25,-13,13,-.25,-13],
// 4 15 29 -.25 29 29 -.25 33 9 -.25 7 11 -.25 5
  [4,15,29,-.25,29,29,-.25,33,9,-.25,7,11,-.25,5],
// 4 15 3 -.25 10 1 -.25 10.5 -3 -.25 10 6 -.25 9
  [4,15,3,-.25,10,1,-.25,10.5,-3,-.25,10,6,-.25,9],
// 4 15 6 -.25 9 -3 -.25 10 2.5 -.25 -4 9 -.25 7
  [4,15,6,-.25,9,-3,-.25,10,2.5,-.25,-4,9,-.25,7],
// 4 15 11 -.25 5 9 -.25 7 2.5 -.25 -4 13 -.25 1
  [4,15,11,-.25,5,9,-.25,7,2.5,-.25,-4,13,-.25,1],
// 3 15 13 -.25 1 2.5 -.25 -4 14 -.25 -4
  [3,15,13,-.25,1,2.5,-.25,-4,14,-.25,-4],
// 4 15 -2 -.25 -4 2.5 -.25 -4 -3 -.25 10 -7 -.25 8
  [4,15,-2,-.25,-4,2.5,-.25,-4,-3,-.25,10,-7,-.25,8],
// 4 15 -2 -.25 -4 -7 -.25 8 -11 -.25 4 -2 -.25 -8.5
  [4,15,-2,-.25,-4,-7,-.25,8,-11,-.25,4,-2,-.25,-8.5],
// 4 15 -2 -.25 -8.5 -11 -.25 4 -13 -.25 0 -14 -.25 -5
  [4,15,-2,-.25,-8.5,-11,-.25,4,-13,-.25,0,-14,-.25,-5],
// 4 15 -2 -.25 -8.5 -14 -.25 -5 -14.5 -.25 -10 -2 -.25 -13
  [4,15,-2,-.25,-8.5,-14,-.25,-5,-14.5,-.25,-10,-2,-.25,-13],
// 4 15 -2 -.25 -13 -14.5 -.25 -10 -14 -.25 -17 -9.9 -.25 -18.3
  [4,15,-2,-.25,-13,-14.5,-.25,-10,-14,-.25,-17,-9.9,-.25,-18.3],
// 4 15 -9.9 -.25 -18.3 -14 -.25 -17 -13.4 -.25 -18.5 -12.5 -.25 -18.8
  [4,15,-9.9,-.25,-18.3,-14,-.25,-17,-13.4,-.25,-18.5,-12.5,-.25,-18.8],
// 3 15 -2 -.25 -13 -9.9 -.25 -18.3 -7 -.25 -18
  [3,15,-2,-.25,-13,-9.9,-.25,-18.3,-7,-.25,-18],
// 4 15 -28.5 -.25 -46 -7 -.25 -18 -9.9 -.25 -18.3 -29 -.25 -43
  [4,15,-28.5,-.25,-46,-7,-.25,-18,-9.9,-.25,-18.3,-29,-.25,-43],
// 4 15 -2 -.25 -13 -7 -.25 -18 -3.6 -.25 -17.9 2.5 -.25 -13
  [4,15,-2,-.25,-13,-7,-.25,-18,-3.6,-.25,-17.9,2.5,-.25,-13],
// 3 15 2.5 -.25 -13 -3.6 -.25 -17.9 -.5 -.25 -18.5
  [3,15,2.5,-.25,-13,-3.6,-.25,-17.9,-.5,-.25,-18.5],
// 4 15 2.5 -.25 -13 -.5 -.25 -18.5 2 -.25 -19.6 13 -.25 -13
  [4,15,2.5,-.25,-13,-.5,-.25,-18.5,2,-.25,-19.6,13,-.25,-13],
// 4 15 13 -.25 -13 2 -.25 -19.6 3.5 -.25 -20.9 13 -.25 -23
  [4,15,13,-.25,-13,2,-.25,-19.6,3.5,-.25,-20.9,13,-.25,-23],
// 4 15 13 -.25 -23 3.5 -.25 -20.9 7 -.25 -24 9 -.25 -25.5
  [4,15,13,-.25,-23,3.5,-.25,-20.9,7,-.25,-24,9,-.25,-25.5],
// 4 15 12.5 -.25 -24.5 13 -.25 -23 9 -.25 -25.5 10.5 -.25 -25.7
  [4,15,12.5,-.25,-24.5,13,-.25,-23,9,-.25,-25.5,10.5,-.25,-25.7],
// 3 15 12.5 -.25 -24.5 10.5 -.25 -25.7 11.8 -.25 -25.4
  [3,15,12.5,-.25,-24.5,10.5,-.25,-25.7,11.8,-.25,-25.4],
// 3 15 -29 -.25 -43 -29 -.25 -46 -28.5 -.25 -46
  [3,15,-29,-.25,-43,-29,-.25,-46,-28.5,-.25,-46],
// 
// 4 16 -14 0 -5 -14 -.25 -5 -13 -.25 0 -13 0 0
  [4,16,-14,0,-5,-14,-.25,-5,-13,-.25,0,-13,0,0],
// 4 16 -14.5 0 -10 -14.5 -.25 -10 -14 -.25 -5 -14 0 -5
  [4,16,-14.5,0,-10,-14.5,-.25,-10,-14,-.25,-5,-14,0,-5],
// 4 16 -29 0 -29 -29 -.25 -29 -14.5 -.25 -10 -14.5 0 -10
  [4,16,-29,0,-29,-29,-.25,-29,-14.5,-.25,-10,-14.5,0,-10],
// 4 16 -29 0 -43 -29 -.25 -43 -29 -.25 -29 -29 0 -29
  [4,16,-29,0,-43,-29,-.25,-43,-29,-.25,-29,-29,0,-29],
// 4 16 -3 0 10 -3 -.25 10 1 -.25 10.5 1 0 10.5
  [4,16,-3,0,10,-3,-.25,10,1,-.25,10.5,1,0,10.5],
// 4 16 -7 0 8 -7 -.25 8 -3 -.25 10 -3 0 10
  [4,16,-7,0,8,-7,-.25,8,-3,-.25,10,-3,0,10],
// 4 16 -11 0 4 -11 -.25 4 -7 -.25 8 -7 0 8
  [4,16,-11,0,4,-11,-.25,4,-7,-.25,8,-7,0,8],
// 4 16 -13 0 0 -13 -.25 0 -11 -.25 4 -11 0 4
  [4,16,-13,0,0,-13,-.25,0,-11,-.25,4,-11,0,4],
// 4 16 -29 0 -46 -29 -.25 -46 -29 -.25 -43 -29 0 -43
  [4,16,-29,0,-46,-29,-.25,-46,-29,-.25,-43,-29,0,-43],
// 4 16 -28.5 0 -46 -28.5 -.25 -46 -29 -.25 -46 -29 0 -46
  [4,16,-28.5,0,-46,-28.5,-.25,-46,-29,-.25,-46,-29,0,-46],
// 4 16 9 0 -25.5 9 -.25 -25.5 7 -.25 -24 7 0 -24
  [4,16,9,0,-25.5,9,-.25,-25.5,7,-.25,-24,7,0,-24],
// 4 16 10.5 0 -25.7 10.5 -.25 -25.7 9 -.25 -25.5 9 0 -25.5
  [4,16,10.5,0,-25.7,10.5,-.25,-25.7,9,-.25,-25.5,9,0,-25.5],
// 4 16 11.8 0 -25.4 11.8 -.25 -25.4 10.5 -.25 -25.7 10.5 0 -25.7
  [4,16,11.8,0,-25.4,11.8,-.25,-25.4,10.5,-.25,-25.7,10.5,0,-25.7],
// 4 16 12.5 0 -24.5 12.5 -.25 -24.5 11.8 -.25 -25.4 11.8 0 -25.4
  [4,16,12.5,0,-24.5,12.5,-.25,-24.5,11.8,-.25,-25.4,11.8,0,-25.4],
// 4 16 -19 0 -46 -19 -.25 -46 -28.5 -.25 -46 -28.5 0 -46
  [4,16,-19,0,-46,-19,-.25,-46,-28.5,-.25,-46,-28.5,0,-46],
// 4 16 .5 0 -21.5 .5 -.25 -21.5 -19 -.25 -46 -19 0 -46
  [4,16,.5,0,-21.5,.5,-.25,-21.5,-19,-.25,-46,-19,0,-46],
// 4 16 3.5 0 -20.9 3.5 -.25 -20.9 .5 -.25 -21.5 .5 0 -21.5
  [4,16,3.5,0,-20.9,3.5,-.25,-20.9,.5,-.25,-21.5,.5,0,-21.5],
// 4 16 7 0 -24 7 -.25 -24 3.5 -.25 -20.9 3.5 0 -20.9
  [4,16,7,0,-24,7,-.25,-24,3.5,-.25,-20.9,3.5,0,-20.9],
// 4 16 29 0 29 29 -.25 29 29 -.25 16 29 0 16
  [4,16,29,0,29,29,-.25,29,29,-.25,16,29,0,16],
// 4 16 29 0 33 29 -.25 33 29 -.25 29 29 0 29
  [4,16,29,0,33,29,-.25,33,29,-.25,29,29,0,29],
// 4 16 29 0 46 29 -.25 46 29 -.25 33 29 0 33
  [4,16,29,0,46,29,-.25,46,29,-.25,33,29,0,33],
// 4 16 1 0 10.5 1 -.25 10.5 29 -.25 46 29 0 46
  [4,16,1,0,10.5,1,-.25,10.5,29,-.25,46,29,0,46],
// 4 16 13 0 -23 13 -.25 -23 12.5 -.25 -24.5 12.5 0 -24.5
  [4,16,13,0,-23,13,-.25,-23,12.5,-.25,-24.5,12.5,0,-24.5],
// 4 16 13 0 -13 13 -.25 -13 13 -.25 -23 13 0 -23
  [4,16,13,0,-13,13,-.25,-13,13,-.25,-23,13,0,-23],
// 4 16 14 0 -4 14 -.25 -4 13 -.25 -13 13 0 -13
  [4,16,14,0,-4,14,-.25,-4,13,-.25,-13,13,0,-13],
// 4 16 29 0 16 29 -.25 16 14 -.25 -4 14 0 -4
  [4,16,29,0,16,29,-.25,16,14,-.25,-4,14,0,-4],
// 5 24 3.5 -.25 -20.9 3.5 0 -20.9 7 -.25 -24 .5 -.25 -21.5
  [5,24,3.5,-.25,-20.9,3.5,0,-20.9,7,-.25,-24,.5,-.25,-21.5],
// 5 24 7 -.25 -24 7 0 -24 9 -.25 -25.5 3.5 -.25 -20.9
  [5,24,7,-.25,-24,7,0,-24,9,-.25,-25.5,3.5,-.25,-20.9],
// 5 24 9 -.25 -25.5 9 0 -25.5 10.5 -.25 -25.7 7 -.25 -24
  [5,24,9,-.25,-25.5,9,0,-25.5,10.5,-.25,-25.7,7,-.25,-24],
// 5 24 10.5 -.25 -25.7 10.5 0 -25.7 11.8 -.25 -25.4 9 -.25 -25.5
  [5,24,10.5,-.25,-25.7,10.5,0,-25.7,11.8,-.25,-25.4,9,-.25,-25.5],
// 5 24 .5 -.25 -21.5 .5 0 -21.5 3.5 -.25 -20.9 -19 -.25 -46
  [5,24,.5,-.25,-21.5,.5,0,-21.5,3.5,-.25,-20.9,-19,-.25,-46],
// 5 24 11.8 -.25 -25.4 11.8 0 -25.4 12.5 -.25 -24.5 10.5 -.25 -25.7
  [5,24,11.8,-.25,-25.4,11.8,0,-25.4,12.5,-.25,-24.5,10.5,-.25,-25.7],
// 5 24 12.5 -.25 -24.5 12.5 0 -24.5 13 -.25 -23 11.8 -.25 -25.4
  [5,24,12.5,-.25,-24.5,12.5,0,-24.5,13,-.25,-23,11.8,-.25,-25.4],
// 5 24 13 -.25 -23 13 0 -23 13 -.25 -13 12.5 -.25 -24.5
  [5,24,13,-.25,-23,13,0,-23,13,-.25,-13,12.5,-.25,-24.5],
// 5 24 13 -.25 -13 13 0 -13 14 -.25 -4 13 -.25 -23
  [5,24,13,-.25,-13,13,0,-13,14,-.25,-4,13,-.25,-23],
// 5 24 -11 -.25 4 -11 0 4 -13 -.25 0 -7 -.25 8
  [5,24,-11,-.25,4,-11,0,4,-13,-.25,0,-7,-.25,8],
// 5 24 -13 -.25 0 -13 0 0 -14 -.25 -5 -11 -.25 4
  [5,24,-13,-.25,0,-13,0,0,-14,-.25,-5,-11,-.25,4],
// 5 24 -14 -.25 -5 -14 0 -5 -14.5 -.25 -10 -13 -.25 0
  [5,24,-14,-.25,-5,-14,0,-5,-14.5,-.25,-10,-13,-.25,0],
// 5 24 -3 -.25 10 -3 0 10 -7 -.25 8 1 -.25 10.5
  [5,24,-3,-.25,10,-3,0,10,-7,-.25,8,1,-.25,10.5],
// 5 24 -7 -.25 8 -7 0 8 -11 -.25 4 -3 -.25 10
  [5,24,-7,-.25,8,-7,0,8,-11,-.25,4,-3,-.25,10],
];
module ldraw_lib__195985b(step=0, col=false, unit=2/5, alt=false, line=0.2, solid=!$preview)
    makepoly(ldraw_lib__195985b(solid), step=step, col=col, unit=unit, alt=alt, line=line, solid=solid);
ldraw_lib__195985b(line=0.2);
